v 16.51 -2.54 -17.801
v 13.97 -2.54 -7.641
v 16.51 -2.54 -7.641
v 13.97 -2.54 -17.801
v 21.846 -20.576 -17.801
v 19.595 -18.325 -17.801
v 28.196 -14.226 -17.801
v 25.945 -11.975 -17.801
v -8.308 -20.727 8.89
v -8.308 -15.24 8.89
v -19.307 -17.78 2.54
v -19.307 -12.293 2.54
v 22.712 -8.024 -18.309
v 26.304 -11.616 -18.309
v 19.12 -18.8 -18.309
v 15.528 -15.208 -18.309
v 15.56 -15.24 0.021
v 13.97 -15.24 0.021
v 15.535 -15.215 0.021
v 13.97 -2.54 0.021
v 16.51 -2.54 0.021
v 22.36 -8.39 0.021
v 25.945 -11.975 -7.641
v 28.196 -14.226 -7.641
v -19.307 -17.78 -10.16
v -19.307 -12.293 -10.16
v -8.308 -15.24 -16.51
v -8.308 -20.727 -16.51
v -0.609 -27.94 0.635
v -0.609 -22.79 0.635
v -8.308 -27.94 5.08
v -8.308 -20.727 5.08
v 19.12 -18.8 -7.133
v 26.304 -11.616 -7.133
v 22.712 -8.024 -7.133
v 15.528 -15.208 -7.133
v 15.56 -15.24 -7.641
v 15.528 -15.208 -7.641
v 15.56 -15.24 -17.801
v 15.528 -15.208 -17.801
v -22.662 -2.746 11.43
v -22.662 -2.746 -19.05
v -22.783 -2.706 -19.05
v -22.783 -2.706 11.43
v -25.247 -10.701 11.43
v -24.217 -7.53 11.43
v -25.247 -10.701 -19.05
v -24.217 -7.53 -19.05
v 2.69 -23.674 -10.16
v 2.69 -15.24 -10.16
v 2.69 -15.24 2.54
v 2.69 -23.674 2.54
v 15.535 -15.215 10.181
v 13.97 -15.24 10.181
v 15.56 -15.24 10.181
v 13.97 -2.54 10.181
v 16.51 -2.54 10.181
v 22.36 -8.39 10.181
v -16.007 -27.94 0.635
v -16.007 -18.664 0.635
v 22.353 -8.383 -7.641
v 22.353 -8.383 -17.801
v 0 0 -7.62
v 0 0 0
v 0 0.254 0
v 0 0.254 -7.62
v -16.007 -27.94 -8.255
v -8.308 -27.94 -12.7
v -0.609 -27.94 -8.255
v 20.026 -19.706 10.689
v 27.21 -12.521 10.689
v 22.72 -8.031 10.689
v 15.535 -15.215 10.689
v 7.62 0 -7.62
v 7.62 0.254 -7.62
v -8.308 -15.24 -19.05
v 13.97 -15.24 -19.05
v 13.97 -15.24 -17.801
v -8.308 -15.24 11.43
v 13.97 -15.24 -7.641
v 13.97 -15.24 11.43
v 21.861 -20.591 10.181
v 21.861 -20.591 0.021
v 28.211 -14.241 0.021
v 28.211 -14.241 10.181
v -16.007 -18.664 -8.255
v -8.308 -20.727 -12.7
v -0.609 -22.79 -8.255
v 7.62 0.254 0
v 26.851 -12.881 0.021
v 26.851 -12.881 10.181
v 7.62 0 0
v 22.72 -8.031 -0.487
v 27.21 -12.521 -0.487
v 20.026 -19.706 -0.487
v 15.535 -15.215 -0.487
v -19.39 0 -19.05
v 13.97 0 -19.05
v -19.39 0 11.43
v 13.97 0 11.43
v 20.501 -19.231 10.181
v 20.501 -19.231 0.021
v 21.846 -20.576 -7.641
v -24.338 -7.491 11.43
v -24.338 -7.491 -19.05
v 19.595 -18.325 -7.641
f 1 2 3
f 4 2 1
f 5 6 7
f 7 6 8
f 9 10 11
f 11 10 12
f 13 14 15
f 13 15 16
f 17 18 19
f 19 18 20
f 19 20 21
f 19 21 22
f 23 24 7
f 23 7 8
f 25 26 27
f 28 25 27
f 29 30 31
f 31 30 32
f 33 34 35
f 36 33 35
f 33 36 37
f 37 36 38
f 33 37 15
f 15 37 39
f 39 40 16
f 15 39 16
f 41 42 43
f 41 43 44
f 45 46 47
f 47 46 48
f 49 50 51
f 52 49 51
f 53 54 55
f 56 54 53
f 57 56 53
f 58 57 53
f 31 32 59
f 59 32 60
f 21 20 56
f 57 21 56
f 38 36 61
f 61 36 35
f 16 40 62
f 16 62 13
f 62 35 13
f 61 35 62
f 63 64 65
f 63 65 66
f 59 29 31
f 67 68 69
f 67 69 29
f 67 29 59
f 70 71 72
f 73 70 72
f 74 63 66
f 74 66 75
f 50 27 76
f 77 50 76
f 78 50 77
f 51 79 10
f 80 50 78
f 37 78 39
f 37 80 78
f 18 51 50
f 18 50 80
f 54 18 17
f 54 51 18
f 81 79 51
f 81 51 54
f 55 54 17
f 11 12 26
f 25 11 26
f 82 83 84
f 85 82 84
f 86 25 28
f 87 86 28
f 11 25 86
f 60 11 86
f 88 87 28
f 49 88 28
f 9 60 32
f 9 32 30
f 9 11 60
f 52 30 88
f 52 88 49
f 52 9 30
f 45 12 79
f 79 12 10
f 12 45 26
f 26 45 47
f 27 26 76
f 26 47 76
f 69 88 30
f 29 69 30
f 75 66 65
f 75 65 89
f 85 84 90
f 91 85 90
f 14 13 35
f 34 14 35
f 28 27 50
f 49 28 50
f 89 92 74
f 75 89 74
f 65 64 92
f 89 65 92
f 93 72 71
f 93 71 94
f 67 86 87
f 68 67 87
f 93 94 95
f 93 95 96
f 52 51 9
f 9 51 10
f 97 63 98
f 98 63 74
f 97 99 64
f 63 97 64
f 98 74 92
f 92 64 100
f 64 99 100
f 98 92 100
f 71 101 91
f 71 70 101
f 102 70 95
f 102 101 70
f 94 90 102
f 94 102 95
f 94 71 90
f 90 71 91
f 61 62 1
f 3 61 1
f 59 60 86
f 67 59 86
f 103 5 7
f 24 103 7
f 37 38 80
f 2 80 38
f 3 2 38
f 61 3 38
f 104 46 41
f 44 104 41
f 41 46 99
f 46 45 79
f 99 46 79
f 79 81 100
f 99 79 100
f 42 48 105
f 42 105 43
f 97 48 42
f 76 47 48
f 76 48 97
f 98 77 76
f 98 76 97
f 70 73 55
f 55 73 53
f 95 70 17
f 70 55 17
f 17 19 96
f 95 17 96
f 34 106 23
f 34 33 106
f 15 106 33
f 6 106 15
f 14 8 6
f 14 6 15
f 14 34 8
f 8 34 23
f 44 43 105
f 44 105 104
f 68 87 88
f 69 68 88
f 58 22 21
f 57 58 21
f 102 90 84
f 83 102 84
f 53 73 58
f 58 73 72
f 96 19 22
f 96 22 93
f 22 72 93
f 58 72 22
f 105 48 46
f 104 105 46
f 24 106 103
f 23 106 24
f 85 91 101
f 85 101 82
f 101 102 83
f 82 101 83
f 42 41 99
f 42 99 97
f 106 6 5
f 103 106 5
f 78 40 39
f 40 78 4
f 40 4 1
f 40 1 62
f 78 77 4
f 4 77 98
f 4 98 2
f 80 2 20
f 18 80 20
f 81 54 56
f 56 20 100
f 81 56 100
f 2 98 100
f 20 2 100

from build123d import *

# Parameters (mm, degrees)
SKETCH1_W                 = 7.62
SKETCH1_H                 = 7.62
BOSS_EXTRUDE1_DEPTH       = 0.254
SKETCH2_W                 = 7.62
SKETCH2_H                 = 7.62
BOSS_EXTRUDE2_DEPTH       = 15.24
CHAMFER1_SIZE             = 7.62
CHAMFER1_SIZE2            = 4.399409051
CHAMFER2_SIZE             = 3.81
CHAMFER2_SIZE2            = 7.16045777
BOSS_EXTRUDE5_DEPTH       = 12.7
SKETCH7_W                 = 10.16
SKETCH7_H                 = 12.7
BOSS_EXTRUDE7_DEPTH       = 2.54
SWEEP1_START              = 0.02132645
SWEEP1_DEPTH              = 10.16
SWEEP2_START              = -17.80132645
SWEEP2_DEPTH              = 10.16
BOSS_EXTRUDE9_DEPTH       = 0.508
SKETCH12_W                = 11.176
SKETCH12_H                = 5.08
BOSS_EXTRUDE11_DEPTH      = 10.16
BOSS_EXTRUDE12_DEPTH      = 0.508
SKETCH14_W                = 11.176
SKETCH14_H                = 6.35
BOSS_EXTRUDE13_DEPTH      = 10.16
SKETCH17_W                = 30.48
SKETCH17_H                = 15.24
BOSS_EXTRUDE16_DEPTH      = 40.64
CHAMFER10_SIZE            = 15.08
CHAMFER10_SIZE2           = 4.899789019
CHAMFER11_SIZE            = 4.92
CHAMFER11_SIZE_2          = 18.361689973
CHAMFER12_SIZE            = 2.38
CHAMFER12_SIZE2           = 2.886919979
CUT_EXTRUDE1_DEPTH        = 12.7
BOSS_EXTRUDE17_DEPTH      = 12.7
BOSS_EXTRUDE17_DEPTH_BACK = 5.08
CHAMFER14_SIZE            = 10.16
CHAMFER14_SIZE_2          = 37.917636205
BOSS_EXTRUDE18_DEPTH      = 12.7
SKETCH22_W                = 30.48
SKETCH22_H                = 5.030470453
BOSS_EXTRUDE19_DEPTH      = 0.127


# Read off the part's stored shape, not the designer's step: Sweep1, Sweep2
with BuildPart() as part:
    # Sketch1 → Boss-Extrude1 (new body)
    with BuildSketch(Plane(origin=(0, 0, 0), x_dir=(1, 0, 0), z_dir=(0, 1, 0))):
        with Locations((3.81, 3.81)):
            Rectangle(SKETCH1_W, SKETCH1_H)
    extrude(amount=BOSS_EXTRUDE1_DEPTH)

    # Sketch2 → Boss-Extrude2 (add)
    with BuildSketch(Plane.XZ):
        Polygon((7.62, -7.62), (3.81, -7.62), (3.81, -19.05), (13.97, -19.05), (13.97, 11.43), (3.81, 11.43), (3.81, 0), (7.62, 0), align=None)
        Polygon((3.81, -19.05), (3.81, -7.62), (0, -7.62), (0, 0), (3.81, 0), (3.81, 11.43), (-11.525577389, 11.43), (-11.525577389, -19.05), align=None)
        with Locations((3.81, -3.81)):
            Rectangle(SKETCH2_W, SKETCH2_H)
    extrude(amount=BOSS_EXTRUDE2_DEPTH)

    # Chamfer1
    chamfer1_edges = [part.edges().sort_by_distance(p)[0] for p in [
        (-11.525577389, 0, -3.81),
    ]]
    chamfer1_side = [part.faces().sort_by_distance(p)[0] for p in [
        (1.222211305, 0, -18.652626767),
    ]]
    chamfer(chamfer1_edges, length=CHAMFER1_SIZE, length2=CHAMFER1_SIZE2, reference=chamfer1_side[0])

    # Chamfer2
    chamfer2_edges = [part.edges().sort_by_distance(p)[0] for p in [
        (-11.525577389, -4.399409051, -3.81),
    ]]
    chamfer2_side = [part.faces().sort_by_distance(p)[0] for p in [
        (-7.715577389, -2.199704526, -3.81),
    ]]
    chamfer(chamfer2_edges, length=CHAMFER2_SIZE, length2=CHAMFER2_SIZE2, reference=chamfer2_side[0])

    # Sketch3 → Boss-Extrude5 (add)
    with BuildSketch(Plane.XZ.offset(15.24)):
        Polygon((1.222211305, -13.998435267), (10.045655072, -8.904217634), (10.045655072, 1.284217634), (1.222211305, 6.378435267), (-7.601232461, 1.284217634), (-7.601232461, -8.904217634), align=None)
    extrude(amount=BOSS_EXTRUDE5_DEPTH)

    # Sketch7 → Boss-Extrude7 (add)
    with BuildSketch(Plane(origin=(13.97, 0, 0), x_dir=(0, 0, -1), z_dir=(1, 0, 0))):
        Polygon((-3.81, -7.62), (-0.02132645, -7.62), (-0.02132645, -2.54), (-10.18132645, -2.54), (-10.18132645, -7.62), align=None)
        Polygon((-3.83132645, -15.24), (-3.81, -7.62), (-10.18132645, -7.62), (-10.18132645, -15.24), align=None)
        Polygon((-0.02132645, -15.24), (-0.02132645, -7.62), (-3.81, -7.62), (-3.83132645, -15.24), align=None)
        with Locations((12.72132645, -8.89)):
            Rectangle(SKETCH7_W, SKETCH7_H)
    extrude(amount=BOSS_EXTRUDE7_DEPTH)

    # Sweep1 outline → Sweep1 (add)
    with BuildSketch(Plane.XY.offset(SWEEP1_START)):
        Polygon((16.51, -15.24), (29.045138309, -27.775138309), (29.045138309, -15.075138309), (16.51, -2.54), align=None)
    extrude(amount=SWEEP1_DEPTH)

    # Sweep2 outline → Sweep2 (add)
    with BuildSketch(Plane.XY.offset(SWEEP2_START)):
        Polygon((16.51, -2.54), (16.51, -15.24), (29.030018127, -27.760018127), (29.030018127, -15.060018127), align=None)
    extrude(amount=SWEEP2_DEPTH)

    # Chamfer5
    # the kernel refuses this chamfer: 14.368409794, 10.16 mm, written as the material it takes off along each edge
    with BuildSketch(Plane(origin=(29.045138309, -27.775138309, 0.02132645), x_dir=(-0.7459142715976749, 0.6660419652145878, 0), z_dir=(0, 0, 1)), Plane(origin=(29.030018127, -27.760018127, -17.80132645), x_dir=(-0.7459142715976752, 0.6660419652145875, 0), z_dir=(0, 0, 1))) as chamfer5_piece_1:
        with BuildLine():
            Line((10.176243016, 0), (9.537503791, -11.29142094))
            Line((9.537503791, -11.29142094), (9.323151752, -11.482820218))
            ThreePointArc((9.323151752, -11.482820218), (4.705969637, -5.701770021), (-0.214352039, -0.191399278))
            Line((-0.214352039, -0.191399278), (0.016230053, 0.286909507))
            ThreePointArc((0.016230053, 0.286909507), (5.088121508, 0), (10.192473069, 0.286909507))
            Line((10.192473069, 0.286909507), (10.176243016, 0))
        make_face()
    extrude(amount=10.16, mode=Mode.SUBTRACT)

    # Sketch10 → Boss-Extrude9 (add)
    with BuildSketch(Plane(origin=(6.985, 6.985, 0), x_dir=(0, 0, -1), z_dir=(0.7071067811865389, 0.7071067811865561, 0))):
        Polygon((12.72132645, -21.73350196), (18.30932645, -21.73350196), (18.30932645, -26.81350196), (7.13332645, -26.81350196), (7.13332645, -21.73350196), align=None)
    extrude(amount=BOSS_EXTRUDE9_DEPTH)

    # Sketch12 → Boss-Extrude11 (add)
    with BuildSketch(Plane(origin=(7.344210245, 7.344210245, 0), x_dir=(0, 0, -1), z_dir=(0.707106781186539, 0.707106781186556, 0))):
        with Locations((12.72132645, -24.27350196)):
            Rectangle(SKETCH12_W, SKETCH12_H)
    extrude(amount=-BOSS_EXTRUDE11_DEPTH)

    # Sketch13 → Boss-Extrude12 (add)
    with BuildSketch(Plane(origin=(6.985, 6.985, 0), x_dir=(0, 0, -1), z_dir=(0.7071067811865389, 0.7071067811865562, 0))):
        Polygon((-5.10132645, -21.744193544), (-10.68932645, -21.744193544), (-10.68932645, -28.094193544), (0.48667355, -28.094193544), (0.48667355, -21.744193544), align=None)
    extrude(amount=BOSS_EXTRUDE12_DEPTH)

    # Sketch14 → Boss-Extrude13 (add)
    with BuildSketch(Plane(origin=(7.344210245, 7.344210245, 0), x_dir=(0, 0, -1), z_dir=(0.7071067811865388, 0.7071067811865562, 0))):
        with Locations((-5.10132645, -24.919193544)):
            Rectangle(SKETCH14_W, SKETCH14_H)
    extrude(amount=-BOSS_EXTRUDE13_DEPTH)

    # Sketch17 → Boss-Extrude16 (add)
    with BuildSketch(Plane(origin=(13.97, 0, 0), x_dir=(0, 0, -1), z_dir=(1, 0, 0))):
        with Locations((3.81, -7.62)):
            Rectangle(SKETCH17_W, SKETCH17_H)
    extrude(amount=-BOSS_EXTRUDE16_DEPTH)

    # Chamfer10
    chamfer10_edges = [part.edges().sort_by_distance(p)[0] for p in [
        (-26.67, 0, -3.81),
    ]]
    chamfer10_side = [part.faces().sort_by_distance(p)[0] for p in [
        (-26.67, -7.62, -3.81),
    ]]
    chamfer(chamfer10_edges, length=CHAMFER10_SIZE, length2=CHAMFER10_SIZE2, reference=chamfer10_side[0])

    # Chamfer11
    # the kernel refuses this chamfer: 18.361689973, 4.92 mm, written as the material it takes off along each edge
    with BuildSketch(Plane(origin=(-26.67, -15.24, -66.730196419), x_dir=(-0.13751244702129126, 0.990500038825954, 0), z_dir=(0, 0, 1))) as chamfer11_piece_1:
        Polygon((CHAMFER11_SIZE * 0.990500038826, -CHAMFER11_SIZE * 0.137512447021), (-CHAMFER11_SIZE_2 * 0.137512447023, -CHAMFER11_SIZE_2 * 0.990500038839), (0, 0), align=None)
    extrude(amount=125.840392838, mode=Mode.SUBTRACT)

    # Chamfer12
    chamfer12_edges = [part.edges().sort_by_distance(p)[0] for p in [
        (-21.770210981, 0, -3.81),
    ]]
    chamfer12_side = [part.faces().sort_by_distance(p)[0] for p in [
        (-4.334202117, 0, -3.81),
    ]]
    chamfer(chamfer12_edges, length=CHAMFER12_SIZE, length2=CHAMFER12_SIZE2, reference=chamfer12_side[0])

    # Sketch19 → Cut-Extrude1 (cut)
    with BuildSketch(Plane.XZ.offset(27.94)):
        Polygon((-7.601232461, 1.284217634), (-7.601232461, -8.904217634), (1.222211305, -13.998435267), (10.045655072, -8.904217634), (10.045655072, 1.284217634), (1.222211305, 6.378435267), align=None)
    extrude(amount=-CUT_EXTRUDE1_DEPTH, mode=Mode.SUBTRACT)

    # Sketch20 → Boss-Extrude17 (add, two sides: drawn at the far end of the back side and taken through both)
    with BuildSketch(Plane(origin=(0, -15.24, 0), x_dir=(-1, 0, 0), z_dir=(0, -1, 0)).offset(-BOSS_EXTRUDE17_DEPTH_BACK)):
        Polygon((8.308310027, -8.89), (19.306832655, -2.54), (19.306832655, 10.16), (8.308310027, 16.51), (-2.690212601, 10.16), (-2.690212601, -2.54), align=None)
    extrude(amount=BOSS_EXTRUDE17_DEPTH + BOSS_EXTRUDE17_DEPTH_BACK)

    # Chamfer14
    # the kernel refuses this chamfer: 37.917636205, 10.16 mm, written as the material it takes off along each edge
    with BuildSketch(Plane(origin=(-19.306832655, -27.94, 101.001543824), x_dir=(-0.13751244702129076, 0.9905000388259542, 0), z_dir=(0, 0, -1))) as chamfer14_piece_1:
        Polygon((CHAMFER14_SIZE * 0.990500038826, CHAMFER14_SIZE * 0.137512447021), (-CHAMFER14_SIZE_2 * 0.137512447021, CHAMFER14_SIZE_2 * 0.990500038823), (0, 0), align=None)
    extrude(amount=209.623087649, mode=Mode.SUBTRACT)

    # Sketch21 → Boss-Extrude18 (add)
    with BuildSketch(Plane(origin=(0, -15.24, 0), x_dir=(-1, 0, 0), z_dir=(0, -1, 0))):
        Polygon((8.308310027, -5.08), (16.007275866, -0.635), (16.007275866, 8.255), (8.308310027, 12.7), (0.609344187, 8.255), (0.609344187, -0.635), align=None)
    extrude(amount=BOSS_EXTRUDE18_DEPTH)

    # Sketch22 → Boss-Extrude19 (add)
    with BuildSketch(Plane(origin=(-19.691340818, 6.398104477, 0), x_dir=(0, 0, 1), z_dir=(-0.9510565162951544, 0.30901699437494484, 0))):
        with Locations((-3.81, -12.129520369)):
            Rectangle(SKETCH22_W, SKETCH22_H)
    extrude(amount=BOSS_EXTRUDE19_DEPTH)


solid = part.part
